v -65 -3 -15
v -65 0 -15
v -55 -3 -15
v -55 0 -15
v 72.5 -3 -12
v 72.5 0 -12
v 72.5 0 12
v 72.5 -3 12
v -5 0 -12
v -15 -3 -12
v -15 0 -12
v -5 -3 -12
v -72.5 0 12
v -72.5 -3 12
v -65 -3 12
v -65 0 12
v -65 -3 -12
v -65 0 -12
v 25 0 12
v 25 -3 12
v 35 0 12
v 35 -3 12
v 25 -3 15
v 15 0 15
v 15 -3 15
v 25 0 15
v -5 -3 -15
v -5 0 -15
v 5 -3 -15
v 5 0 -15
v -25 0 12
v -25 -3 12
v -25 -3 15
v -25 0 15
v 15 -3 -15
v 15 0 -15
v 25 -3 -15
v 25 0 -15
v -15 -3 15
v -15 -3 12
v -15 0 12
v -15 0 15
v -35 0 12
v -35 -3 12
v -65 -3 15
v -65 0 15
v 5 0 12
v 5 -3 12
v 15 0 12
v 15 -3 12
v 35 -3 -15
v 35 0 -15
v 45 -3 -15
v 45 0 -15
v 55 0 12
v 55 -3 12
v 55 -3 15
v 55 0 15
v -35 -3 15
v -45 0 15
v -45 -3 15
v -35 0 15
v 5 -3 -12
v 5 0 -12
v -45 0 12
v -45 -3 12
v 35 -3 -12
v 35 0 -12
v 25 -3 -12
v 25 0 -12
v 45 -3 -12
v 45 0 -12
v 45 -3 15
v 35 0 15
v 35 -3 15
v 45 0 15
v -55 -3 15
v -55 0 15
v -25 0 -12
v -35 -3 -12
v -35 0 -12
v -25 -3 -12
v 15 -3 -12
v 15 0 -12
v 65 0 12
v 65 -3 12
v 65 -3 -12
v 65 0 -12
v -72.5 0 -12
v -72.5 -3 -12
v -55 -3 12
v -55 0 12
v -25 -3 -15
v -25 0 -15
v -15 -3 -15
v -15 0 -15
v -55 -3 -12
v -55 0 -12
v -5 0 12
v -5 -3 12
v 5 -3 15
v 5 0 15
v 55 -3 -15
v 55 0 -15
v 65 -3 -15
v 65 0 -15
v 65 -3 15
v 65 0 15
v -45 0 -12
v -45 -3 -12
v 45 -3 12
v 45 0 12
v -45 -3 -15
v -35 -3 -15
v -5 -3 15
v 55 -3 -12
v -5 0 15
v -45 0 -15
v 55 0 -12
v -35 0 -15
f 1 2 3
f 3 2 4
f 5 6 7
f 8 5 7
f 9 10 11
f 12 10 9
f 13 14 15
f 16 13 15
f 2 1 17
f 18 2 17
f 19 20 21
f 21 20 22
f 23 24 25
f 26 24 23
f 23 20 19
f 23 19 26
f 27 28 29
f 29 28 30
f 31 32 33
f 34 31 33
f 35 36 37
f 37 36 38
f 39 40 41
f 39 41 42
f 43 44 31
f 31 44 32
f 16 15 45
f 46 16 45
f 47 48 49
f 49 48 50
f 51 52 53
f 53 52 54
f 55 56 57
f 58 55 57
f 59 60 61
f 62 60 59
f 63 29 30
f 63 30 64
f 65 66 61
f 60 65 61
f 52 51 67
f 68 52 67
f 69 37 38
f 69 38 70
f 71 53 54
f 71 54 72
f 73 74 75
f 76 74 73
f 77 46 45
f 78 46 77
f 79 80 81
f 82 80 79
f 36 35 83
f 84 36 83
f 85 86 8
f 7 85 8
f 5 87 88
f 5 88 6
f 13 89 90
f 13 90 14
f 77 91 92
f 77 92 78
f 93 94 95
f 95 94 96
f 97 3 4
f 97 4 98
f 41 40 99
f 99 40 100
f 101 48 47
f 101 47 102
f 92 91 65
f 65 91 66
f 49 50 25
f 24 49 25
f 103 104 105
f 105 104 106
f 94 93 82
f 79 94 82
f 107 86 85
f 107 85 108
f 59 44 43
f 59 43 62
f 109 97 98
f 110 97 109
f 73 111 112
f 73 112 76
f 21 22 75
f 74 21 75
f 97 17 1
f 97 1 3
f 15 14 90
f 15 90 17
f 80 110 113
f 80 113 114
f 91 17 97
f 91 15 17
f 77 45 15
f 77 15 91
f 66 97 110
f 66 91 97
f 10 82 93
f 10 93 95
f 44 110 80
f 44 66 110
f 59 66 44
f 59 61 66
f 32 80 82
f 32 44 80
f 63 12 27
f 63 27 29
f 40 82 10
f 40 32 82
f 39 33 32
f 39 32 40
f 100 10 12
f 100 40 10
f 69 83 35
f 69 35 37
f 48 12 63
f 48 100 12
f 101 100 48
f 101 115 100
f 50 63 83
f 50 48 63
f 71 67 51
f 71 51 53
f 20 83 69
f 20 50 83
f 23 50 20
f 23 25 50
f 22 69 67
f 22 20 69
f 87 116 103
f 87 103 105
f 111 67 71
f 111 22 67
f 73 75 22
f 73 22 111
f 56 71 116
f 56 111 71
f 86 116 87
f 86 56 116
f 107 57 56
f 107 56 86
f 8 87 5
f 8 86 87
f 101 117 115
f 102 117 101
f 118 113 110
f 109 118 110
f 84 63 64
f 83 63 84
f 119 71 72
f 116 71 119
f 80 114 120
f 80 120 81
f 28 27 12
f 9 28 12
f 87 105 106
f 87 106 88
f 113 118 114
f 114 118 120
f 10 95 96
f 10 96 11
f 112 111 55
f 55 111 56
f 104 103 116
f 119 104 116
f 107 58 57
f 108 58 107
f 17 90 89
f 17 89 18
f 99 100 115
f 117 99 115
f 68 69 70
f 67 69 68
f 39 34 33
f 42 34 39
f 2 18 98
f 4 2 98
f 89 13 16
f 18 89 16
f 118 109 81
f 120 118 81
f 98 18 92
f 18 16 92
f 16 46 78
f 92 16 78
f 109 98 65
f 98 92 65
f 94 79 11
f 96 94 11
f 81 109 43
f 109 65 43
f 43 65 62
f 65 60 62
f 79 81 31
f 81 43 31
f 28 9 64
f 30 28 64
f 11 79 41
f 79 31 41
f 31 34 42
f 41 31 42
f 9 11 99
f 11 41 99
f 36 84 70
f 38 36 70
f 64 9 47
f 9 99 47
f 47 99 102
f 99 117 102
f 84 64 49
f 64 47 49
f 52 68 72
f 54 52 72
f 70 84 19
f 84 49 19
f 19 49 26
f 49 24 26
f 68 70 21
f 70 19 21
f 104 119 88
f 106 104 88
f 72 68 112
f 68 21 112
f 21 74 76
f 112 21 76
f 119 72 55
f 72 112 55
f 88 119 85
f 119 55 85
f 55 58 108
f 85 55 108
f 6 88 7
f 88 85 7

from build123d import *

# Parameters (mm, degrees)
F0_W     = 145
F0_H     = 30
F1_DEPTH = 3
F2_W     = 10
F2_H     = 3
F3_DEPTH = 25


with BuildPart() as f1:
    # F0 (on Front) → F1 (new body)
    with BuildSketch(Plane.XZ):
        Rectangle(F0_W, F0_H)
    extrude(amount=F1_DEPTH)

    # F2 (on face) → F3 (cut)
    with BuildSketch(Plane.XZ.offset(3)):
        with Locations((-70, -13.5)):
            Rectangle(F2_W, F2_H)
        with Locations((-70, 13.5)):
            Rectangle(F2_W, F2_H)
        with Locations((-50, -13.5)):
            Rectangle(F2_W, F2_H)
        with Locations((-50, 13.5)):
            Rectangle(F2_W, F2_H)
        with Locations((-30, -13.5)):
            Rectangle(F2_W, F2_H)
        with Locations((-30, 13.5)):
            Rectangle(F2_W, F2_H)
        with Locations((-10, -13.5)):
            Rectangle(F2_W, F2_H)
        with Locations((-10, 13.5)):
            Rectangle(F2_W, F2_H)
        with Locations((10, -13.5)):
            Rectangle(F2_W, F2_H)
        with Locations((10, 13.5)):
            Rectangle(F2_W, F2_H)
        with Locations((30, -13.5)):
            Rectangle(F2_W, F2_H)
        with Locations((30, 13.5)):
            Rectangle(F2_W, F2_H)
        with Locations((50, -13.5)):
            Rectangle(F2_W, F2_H)
        with Locations((50, 13.5)):
            Rectangle(F2_W, F2_H)
        with Locations((70, -13.5)):
            Rectangle(F2_W, F2_H)
        with Locations((70, 13.5)):
            Rectangle(F2_W, F2_H)
    extrude(amount=-F3_DEPTH, mode=Mode.SUBTRACT)


solid = f1.part
